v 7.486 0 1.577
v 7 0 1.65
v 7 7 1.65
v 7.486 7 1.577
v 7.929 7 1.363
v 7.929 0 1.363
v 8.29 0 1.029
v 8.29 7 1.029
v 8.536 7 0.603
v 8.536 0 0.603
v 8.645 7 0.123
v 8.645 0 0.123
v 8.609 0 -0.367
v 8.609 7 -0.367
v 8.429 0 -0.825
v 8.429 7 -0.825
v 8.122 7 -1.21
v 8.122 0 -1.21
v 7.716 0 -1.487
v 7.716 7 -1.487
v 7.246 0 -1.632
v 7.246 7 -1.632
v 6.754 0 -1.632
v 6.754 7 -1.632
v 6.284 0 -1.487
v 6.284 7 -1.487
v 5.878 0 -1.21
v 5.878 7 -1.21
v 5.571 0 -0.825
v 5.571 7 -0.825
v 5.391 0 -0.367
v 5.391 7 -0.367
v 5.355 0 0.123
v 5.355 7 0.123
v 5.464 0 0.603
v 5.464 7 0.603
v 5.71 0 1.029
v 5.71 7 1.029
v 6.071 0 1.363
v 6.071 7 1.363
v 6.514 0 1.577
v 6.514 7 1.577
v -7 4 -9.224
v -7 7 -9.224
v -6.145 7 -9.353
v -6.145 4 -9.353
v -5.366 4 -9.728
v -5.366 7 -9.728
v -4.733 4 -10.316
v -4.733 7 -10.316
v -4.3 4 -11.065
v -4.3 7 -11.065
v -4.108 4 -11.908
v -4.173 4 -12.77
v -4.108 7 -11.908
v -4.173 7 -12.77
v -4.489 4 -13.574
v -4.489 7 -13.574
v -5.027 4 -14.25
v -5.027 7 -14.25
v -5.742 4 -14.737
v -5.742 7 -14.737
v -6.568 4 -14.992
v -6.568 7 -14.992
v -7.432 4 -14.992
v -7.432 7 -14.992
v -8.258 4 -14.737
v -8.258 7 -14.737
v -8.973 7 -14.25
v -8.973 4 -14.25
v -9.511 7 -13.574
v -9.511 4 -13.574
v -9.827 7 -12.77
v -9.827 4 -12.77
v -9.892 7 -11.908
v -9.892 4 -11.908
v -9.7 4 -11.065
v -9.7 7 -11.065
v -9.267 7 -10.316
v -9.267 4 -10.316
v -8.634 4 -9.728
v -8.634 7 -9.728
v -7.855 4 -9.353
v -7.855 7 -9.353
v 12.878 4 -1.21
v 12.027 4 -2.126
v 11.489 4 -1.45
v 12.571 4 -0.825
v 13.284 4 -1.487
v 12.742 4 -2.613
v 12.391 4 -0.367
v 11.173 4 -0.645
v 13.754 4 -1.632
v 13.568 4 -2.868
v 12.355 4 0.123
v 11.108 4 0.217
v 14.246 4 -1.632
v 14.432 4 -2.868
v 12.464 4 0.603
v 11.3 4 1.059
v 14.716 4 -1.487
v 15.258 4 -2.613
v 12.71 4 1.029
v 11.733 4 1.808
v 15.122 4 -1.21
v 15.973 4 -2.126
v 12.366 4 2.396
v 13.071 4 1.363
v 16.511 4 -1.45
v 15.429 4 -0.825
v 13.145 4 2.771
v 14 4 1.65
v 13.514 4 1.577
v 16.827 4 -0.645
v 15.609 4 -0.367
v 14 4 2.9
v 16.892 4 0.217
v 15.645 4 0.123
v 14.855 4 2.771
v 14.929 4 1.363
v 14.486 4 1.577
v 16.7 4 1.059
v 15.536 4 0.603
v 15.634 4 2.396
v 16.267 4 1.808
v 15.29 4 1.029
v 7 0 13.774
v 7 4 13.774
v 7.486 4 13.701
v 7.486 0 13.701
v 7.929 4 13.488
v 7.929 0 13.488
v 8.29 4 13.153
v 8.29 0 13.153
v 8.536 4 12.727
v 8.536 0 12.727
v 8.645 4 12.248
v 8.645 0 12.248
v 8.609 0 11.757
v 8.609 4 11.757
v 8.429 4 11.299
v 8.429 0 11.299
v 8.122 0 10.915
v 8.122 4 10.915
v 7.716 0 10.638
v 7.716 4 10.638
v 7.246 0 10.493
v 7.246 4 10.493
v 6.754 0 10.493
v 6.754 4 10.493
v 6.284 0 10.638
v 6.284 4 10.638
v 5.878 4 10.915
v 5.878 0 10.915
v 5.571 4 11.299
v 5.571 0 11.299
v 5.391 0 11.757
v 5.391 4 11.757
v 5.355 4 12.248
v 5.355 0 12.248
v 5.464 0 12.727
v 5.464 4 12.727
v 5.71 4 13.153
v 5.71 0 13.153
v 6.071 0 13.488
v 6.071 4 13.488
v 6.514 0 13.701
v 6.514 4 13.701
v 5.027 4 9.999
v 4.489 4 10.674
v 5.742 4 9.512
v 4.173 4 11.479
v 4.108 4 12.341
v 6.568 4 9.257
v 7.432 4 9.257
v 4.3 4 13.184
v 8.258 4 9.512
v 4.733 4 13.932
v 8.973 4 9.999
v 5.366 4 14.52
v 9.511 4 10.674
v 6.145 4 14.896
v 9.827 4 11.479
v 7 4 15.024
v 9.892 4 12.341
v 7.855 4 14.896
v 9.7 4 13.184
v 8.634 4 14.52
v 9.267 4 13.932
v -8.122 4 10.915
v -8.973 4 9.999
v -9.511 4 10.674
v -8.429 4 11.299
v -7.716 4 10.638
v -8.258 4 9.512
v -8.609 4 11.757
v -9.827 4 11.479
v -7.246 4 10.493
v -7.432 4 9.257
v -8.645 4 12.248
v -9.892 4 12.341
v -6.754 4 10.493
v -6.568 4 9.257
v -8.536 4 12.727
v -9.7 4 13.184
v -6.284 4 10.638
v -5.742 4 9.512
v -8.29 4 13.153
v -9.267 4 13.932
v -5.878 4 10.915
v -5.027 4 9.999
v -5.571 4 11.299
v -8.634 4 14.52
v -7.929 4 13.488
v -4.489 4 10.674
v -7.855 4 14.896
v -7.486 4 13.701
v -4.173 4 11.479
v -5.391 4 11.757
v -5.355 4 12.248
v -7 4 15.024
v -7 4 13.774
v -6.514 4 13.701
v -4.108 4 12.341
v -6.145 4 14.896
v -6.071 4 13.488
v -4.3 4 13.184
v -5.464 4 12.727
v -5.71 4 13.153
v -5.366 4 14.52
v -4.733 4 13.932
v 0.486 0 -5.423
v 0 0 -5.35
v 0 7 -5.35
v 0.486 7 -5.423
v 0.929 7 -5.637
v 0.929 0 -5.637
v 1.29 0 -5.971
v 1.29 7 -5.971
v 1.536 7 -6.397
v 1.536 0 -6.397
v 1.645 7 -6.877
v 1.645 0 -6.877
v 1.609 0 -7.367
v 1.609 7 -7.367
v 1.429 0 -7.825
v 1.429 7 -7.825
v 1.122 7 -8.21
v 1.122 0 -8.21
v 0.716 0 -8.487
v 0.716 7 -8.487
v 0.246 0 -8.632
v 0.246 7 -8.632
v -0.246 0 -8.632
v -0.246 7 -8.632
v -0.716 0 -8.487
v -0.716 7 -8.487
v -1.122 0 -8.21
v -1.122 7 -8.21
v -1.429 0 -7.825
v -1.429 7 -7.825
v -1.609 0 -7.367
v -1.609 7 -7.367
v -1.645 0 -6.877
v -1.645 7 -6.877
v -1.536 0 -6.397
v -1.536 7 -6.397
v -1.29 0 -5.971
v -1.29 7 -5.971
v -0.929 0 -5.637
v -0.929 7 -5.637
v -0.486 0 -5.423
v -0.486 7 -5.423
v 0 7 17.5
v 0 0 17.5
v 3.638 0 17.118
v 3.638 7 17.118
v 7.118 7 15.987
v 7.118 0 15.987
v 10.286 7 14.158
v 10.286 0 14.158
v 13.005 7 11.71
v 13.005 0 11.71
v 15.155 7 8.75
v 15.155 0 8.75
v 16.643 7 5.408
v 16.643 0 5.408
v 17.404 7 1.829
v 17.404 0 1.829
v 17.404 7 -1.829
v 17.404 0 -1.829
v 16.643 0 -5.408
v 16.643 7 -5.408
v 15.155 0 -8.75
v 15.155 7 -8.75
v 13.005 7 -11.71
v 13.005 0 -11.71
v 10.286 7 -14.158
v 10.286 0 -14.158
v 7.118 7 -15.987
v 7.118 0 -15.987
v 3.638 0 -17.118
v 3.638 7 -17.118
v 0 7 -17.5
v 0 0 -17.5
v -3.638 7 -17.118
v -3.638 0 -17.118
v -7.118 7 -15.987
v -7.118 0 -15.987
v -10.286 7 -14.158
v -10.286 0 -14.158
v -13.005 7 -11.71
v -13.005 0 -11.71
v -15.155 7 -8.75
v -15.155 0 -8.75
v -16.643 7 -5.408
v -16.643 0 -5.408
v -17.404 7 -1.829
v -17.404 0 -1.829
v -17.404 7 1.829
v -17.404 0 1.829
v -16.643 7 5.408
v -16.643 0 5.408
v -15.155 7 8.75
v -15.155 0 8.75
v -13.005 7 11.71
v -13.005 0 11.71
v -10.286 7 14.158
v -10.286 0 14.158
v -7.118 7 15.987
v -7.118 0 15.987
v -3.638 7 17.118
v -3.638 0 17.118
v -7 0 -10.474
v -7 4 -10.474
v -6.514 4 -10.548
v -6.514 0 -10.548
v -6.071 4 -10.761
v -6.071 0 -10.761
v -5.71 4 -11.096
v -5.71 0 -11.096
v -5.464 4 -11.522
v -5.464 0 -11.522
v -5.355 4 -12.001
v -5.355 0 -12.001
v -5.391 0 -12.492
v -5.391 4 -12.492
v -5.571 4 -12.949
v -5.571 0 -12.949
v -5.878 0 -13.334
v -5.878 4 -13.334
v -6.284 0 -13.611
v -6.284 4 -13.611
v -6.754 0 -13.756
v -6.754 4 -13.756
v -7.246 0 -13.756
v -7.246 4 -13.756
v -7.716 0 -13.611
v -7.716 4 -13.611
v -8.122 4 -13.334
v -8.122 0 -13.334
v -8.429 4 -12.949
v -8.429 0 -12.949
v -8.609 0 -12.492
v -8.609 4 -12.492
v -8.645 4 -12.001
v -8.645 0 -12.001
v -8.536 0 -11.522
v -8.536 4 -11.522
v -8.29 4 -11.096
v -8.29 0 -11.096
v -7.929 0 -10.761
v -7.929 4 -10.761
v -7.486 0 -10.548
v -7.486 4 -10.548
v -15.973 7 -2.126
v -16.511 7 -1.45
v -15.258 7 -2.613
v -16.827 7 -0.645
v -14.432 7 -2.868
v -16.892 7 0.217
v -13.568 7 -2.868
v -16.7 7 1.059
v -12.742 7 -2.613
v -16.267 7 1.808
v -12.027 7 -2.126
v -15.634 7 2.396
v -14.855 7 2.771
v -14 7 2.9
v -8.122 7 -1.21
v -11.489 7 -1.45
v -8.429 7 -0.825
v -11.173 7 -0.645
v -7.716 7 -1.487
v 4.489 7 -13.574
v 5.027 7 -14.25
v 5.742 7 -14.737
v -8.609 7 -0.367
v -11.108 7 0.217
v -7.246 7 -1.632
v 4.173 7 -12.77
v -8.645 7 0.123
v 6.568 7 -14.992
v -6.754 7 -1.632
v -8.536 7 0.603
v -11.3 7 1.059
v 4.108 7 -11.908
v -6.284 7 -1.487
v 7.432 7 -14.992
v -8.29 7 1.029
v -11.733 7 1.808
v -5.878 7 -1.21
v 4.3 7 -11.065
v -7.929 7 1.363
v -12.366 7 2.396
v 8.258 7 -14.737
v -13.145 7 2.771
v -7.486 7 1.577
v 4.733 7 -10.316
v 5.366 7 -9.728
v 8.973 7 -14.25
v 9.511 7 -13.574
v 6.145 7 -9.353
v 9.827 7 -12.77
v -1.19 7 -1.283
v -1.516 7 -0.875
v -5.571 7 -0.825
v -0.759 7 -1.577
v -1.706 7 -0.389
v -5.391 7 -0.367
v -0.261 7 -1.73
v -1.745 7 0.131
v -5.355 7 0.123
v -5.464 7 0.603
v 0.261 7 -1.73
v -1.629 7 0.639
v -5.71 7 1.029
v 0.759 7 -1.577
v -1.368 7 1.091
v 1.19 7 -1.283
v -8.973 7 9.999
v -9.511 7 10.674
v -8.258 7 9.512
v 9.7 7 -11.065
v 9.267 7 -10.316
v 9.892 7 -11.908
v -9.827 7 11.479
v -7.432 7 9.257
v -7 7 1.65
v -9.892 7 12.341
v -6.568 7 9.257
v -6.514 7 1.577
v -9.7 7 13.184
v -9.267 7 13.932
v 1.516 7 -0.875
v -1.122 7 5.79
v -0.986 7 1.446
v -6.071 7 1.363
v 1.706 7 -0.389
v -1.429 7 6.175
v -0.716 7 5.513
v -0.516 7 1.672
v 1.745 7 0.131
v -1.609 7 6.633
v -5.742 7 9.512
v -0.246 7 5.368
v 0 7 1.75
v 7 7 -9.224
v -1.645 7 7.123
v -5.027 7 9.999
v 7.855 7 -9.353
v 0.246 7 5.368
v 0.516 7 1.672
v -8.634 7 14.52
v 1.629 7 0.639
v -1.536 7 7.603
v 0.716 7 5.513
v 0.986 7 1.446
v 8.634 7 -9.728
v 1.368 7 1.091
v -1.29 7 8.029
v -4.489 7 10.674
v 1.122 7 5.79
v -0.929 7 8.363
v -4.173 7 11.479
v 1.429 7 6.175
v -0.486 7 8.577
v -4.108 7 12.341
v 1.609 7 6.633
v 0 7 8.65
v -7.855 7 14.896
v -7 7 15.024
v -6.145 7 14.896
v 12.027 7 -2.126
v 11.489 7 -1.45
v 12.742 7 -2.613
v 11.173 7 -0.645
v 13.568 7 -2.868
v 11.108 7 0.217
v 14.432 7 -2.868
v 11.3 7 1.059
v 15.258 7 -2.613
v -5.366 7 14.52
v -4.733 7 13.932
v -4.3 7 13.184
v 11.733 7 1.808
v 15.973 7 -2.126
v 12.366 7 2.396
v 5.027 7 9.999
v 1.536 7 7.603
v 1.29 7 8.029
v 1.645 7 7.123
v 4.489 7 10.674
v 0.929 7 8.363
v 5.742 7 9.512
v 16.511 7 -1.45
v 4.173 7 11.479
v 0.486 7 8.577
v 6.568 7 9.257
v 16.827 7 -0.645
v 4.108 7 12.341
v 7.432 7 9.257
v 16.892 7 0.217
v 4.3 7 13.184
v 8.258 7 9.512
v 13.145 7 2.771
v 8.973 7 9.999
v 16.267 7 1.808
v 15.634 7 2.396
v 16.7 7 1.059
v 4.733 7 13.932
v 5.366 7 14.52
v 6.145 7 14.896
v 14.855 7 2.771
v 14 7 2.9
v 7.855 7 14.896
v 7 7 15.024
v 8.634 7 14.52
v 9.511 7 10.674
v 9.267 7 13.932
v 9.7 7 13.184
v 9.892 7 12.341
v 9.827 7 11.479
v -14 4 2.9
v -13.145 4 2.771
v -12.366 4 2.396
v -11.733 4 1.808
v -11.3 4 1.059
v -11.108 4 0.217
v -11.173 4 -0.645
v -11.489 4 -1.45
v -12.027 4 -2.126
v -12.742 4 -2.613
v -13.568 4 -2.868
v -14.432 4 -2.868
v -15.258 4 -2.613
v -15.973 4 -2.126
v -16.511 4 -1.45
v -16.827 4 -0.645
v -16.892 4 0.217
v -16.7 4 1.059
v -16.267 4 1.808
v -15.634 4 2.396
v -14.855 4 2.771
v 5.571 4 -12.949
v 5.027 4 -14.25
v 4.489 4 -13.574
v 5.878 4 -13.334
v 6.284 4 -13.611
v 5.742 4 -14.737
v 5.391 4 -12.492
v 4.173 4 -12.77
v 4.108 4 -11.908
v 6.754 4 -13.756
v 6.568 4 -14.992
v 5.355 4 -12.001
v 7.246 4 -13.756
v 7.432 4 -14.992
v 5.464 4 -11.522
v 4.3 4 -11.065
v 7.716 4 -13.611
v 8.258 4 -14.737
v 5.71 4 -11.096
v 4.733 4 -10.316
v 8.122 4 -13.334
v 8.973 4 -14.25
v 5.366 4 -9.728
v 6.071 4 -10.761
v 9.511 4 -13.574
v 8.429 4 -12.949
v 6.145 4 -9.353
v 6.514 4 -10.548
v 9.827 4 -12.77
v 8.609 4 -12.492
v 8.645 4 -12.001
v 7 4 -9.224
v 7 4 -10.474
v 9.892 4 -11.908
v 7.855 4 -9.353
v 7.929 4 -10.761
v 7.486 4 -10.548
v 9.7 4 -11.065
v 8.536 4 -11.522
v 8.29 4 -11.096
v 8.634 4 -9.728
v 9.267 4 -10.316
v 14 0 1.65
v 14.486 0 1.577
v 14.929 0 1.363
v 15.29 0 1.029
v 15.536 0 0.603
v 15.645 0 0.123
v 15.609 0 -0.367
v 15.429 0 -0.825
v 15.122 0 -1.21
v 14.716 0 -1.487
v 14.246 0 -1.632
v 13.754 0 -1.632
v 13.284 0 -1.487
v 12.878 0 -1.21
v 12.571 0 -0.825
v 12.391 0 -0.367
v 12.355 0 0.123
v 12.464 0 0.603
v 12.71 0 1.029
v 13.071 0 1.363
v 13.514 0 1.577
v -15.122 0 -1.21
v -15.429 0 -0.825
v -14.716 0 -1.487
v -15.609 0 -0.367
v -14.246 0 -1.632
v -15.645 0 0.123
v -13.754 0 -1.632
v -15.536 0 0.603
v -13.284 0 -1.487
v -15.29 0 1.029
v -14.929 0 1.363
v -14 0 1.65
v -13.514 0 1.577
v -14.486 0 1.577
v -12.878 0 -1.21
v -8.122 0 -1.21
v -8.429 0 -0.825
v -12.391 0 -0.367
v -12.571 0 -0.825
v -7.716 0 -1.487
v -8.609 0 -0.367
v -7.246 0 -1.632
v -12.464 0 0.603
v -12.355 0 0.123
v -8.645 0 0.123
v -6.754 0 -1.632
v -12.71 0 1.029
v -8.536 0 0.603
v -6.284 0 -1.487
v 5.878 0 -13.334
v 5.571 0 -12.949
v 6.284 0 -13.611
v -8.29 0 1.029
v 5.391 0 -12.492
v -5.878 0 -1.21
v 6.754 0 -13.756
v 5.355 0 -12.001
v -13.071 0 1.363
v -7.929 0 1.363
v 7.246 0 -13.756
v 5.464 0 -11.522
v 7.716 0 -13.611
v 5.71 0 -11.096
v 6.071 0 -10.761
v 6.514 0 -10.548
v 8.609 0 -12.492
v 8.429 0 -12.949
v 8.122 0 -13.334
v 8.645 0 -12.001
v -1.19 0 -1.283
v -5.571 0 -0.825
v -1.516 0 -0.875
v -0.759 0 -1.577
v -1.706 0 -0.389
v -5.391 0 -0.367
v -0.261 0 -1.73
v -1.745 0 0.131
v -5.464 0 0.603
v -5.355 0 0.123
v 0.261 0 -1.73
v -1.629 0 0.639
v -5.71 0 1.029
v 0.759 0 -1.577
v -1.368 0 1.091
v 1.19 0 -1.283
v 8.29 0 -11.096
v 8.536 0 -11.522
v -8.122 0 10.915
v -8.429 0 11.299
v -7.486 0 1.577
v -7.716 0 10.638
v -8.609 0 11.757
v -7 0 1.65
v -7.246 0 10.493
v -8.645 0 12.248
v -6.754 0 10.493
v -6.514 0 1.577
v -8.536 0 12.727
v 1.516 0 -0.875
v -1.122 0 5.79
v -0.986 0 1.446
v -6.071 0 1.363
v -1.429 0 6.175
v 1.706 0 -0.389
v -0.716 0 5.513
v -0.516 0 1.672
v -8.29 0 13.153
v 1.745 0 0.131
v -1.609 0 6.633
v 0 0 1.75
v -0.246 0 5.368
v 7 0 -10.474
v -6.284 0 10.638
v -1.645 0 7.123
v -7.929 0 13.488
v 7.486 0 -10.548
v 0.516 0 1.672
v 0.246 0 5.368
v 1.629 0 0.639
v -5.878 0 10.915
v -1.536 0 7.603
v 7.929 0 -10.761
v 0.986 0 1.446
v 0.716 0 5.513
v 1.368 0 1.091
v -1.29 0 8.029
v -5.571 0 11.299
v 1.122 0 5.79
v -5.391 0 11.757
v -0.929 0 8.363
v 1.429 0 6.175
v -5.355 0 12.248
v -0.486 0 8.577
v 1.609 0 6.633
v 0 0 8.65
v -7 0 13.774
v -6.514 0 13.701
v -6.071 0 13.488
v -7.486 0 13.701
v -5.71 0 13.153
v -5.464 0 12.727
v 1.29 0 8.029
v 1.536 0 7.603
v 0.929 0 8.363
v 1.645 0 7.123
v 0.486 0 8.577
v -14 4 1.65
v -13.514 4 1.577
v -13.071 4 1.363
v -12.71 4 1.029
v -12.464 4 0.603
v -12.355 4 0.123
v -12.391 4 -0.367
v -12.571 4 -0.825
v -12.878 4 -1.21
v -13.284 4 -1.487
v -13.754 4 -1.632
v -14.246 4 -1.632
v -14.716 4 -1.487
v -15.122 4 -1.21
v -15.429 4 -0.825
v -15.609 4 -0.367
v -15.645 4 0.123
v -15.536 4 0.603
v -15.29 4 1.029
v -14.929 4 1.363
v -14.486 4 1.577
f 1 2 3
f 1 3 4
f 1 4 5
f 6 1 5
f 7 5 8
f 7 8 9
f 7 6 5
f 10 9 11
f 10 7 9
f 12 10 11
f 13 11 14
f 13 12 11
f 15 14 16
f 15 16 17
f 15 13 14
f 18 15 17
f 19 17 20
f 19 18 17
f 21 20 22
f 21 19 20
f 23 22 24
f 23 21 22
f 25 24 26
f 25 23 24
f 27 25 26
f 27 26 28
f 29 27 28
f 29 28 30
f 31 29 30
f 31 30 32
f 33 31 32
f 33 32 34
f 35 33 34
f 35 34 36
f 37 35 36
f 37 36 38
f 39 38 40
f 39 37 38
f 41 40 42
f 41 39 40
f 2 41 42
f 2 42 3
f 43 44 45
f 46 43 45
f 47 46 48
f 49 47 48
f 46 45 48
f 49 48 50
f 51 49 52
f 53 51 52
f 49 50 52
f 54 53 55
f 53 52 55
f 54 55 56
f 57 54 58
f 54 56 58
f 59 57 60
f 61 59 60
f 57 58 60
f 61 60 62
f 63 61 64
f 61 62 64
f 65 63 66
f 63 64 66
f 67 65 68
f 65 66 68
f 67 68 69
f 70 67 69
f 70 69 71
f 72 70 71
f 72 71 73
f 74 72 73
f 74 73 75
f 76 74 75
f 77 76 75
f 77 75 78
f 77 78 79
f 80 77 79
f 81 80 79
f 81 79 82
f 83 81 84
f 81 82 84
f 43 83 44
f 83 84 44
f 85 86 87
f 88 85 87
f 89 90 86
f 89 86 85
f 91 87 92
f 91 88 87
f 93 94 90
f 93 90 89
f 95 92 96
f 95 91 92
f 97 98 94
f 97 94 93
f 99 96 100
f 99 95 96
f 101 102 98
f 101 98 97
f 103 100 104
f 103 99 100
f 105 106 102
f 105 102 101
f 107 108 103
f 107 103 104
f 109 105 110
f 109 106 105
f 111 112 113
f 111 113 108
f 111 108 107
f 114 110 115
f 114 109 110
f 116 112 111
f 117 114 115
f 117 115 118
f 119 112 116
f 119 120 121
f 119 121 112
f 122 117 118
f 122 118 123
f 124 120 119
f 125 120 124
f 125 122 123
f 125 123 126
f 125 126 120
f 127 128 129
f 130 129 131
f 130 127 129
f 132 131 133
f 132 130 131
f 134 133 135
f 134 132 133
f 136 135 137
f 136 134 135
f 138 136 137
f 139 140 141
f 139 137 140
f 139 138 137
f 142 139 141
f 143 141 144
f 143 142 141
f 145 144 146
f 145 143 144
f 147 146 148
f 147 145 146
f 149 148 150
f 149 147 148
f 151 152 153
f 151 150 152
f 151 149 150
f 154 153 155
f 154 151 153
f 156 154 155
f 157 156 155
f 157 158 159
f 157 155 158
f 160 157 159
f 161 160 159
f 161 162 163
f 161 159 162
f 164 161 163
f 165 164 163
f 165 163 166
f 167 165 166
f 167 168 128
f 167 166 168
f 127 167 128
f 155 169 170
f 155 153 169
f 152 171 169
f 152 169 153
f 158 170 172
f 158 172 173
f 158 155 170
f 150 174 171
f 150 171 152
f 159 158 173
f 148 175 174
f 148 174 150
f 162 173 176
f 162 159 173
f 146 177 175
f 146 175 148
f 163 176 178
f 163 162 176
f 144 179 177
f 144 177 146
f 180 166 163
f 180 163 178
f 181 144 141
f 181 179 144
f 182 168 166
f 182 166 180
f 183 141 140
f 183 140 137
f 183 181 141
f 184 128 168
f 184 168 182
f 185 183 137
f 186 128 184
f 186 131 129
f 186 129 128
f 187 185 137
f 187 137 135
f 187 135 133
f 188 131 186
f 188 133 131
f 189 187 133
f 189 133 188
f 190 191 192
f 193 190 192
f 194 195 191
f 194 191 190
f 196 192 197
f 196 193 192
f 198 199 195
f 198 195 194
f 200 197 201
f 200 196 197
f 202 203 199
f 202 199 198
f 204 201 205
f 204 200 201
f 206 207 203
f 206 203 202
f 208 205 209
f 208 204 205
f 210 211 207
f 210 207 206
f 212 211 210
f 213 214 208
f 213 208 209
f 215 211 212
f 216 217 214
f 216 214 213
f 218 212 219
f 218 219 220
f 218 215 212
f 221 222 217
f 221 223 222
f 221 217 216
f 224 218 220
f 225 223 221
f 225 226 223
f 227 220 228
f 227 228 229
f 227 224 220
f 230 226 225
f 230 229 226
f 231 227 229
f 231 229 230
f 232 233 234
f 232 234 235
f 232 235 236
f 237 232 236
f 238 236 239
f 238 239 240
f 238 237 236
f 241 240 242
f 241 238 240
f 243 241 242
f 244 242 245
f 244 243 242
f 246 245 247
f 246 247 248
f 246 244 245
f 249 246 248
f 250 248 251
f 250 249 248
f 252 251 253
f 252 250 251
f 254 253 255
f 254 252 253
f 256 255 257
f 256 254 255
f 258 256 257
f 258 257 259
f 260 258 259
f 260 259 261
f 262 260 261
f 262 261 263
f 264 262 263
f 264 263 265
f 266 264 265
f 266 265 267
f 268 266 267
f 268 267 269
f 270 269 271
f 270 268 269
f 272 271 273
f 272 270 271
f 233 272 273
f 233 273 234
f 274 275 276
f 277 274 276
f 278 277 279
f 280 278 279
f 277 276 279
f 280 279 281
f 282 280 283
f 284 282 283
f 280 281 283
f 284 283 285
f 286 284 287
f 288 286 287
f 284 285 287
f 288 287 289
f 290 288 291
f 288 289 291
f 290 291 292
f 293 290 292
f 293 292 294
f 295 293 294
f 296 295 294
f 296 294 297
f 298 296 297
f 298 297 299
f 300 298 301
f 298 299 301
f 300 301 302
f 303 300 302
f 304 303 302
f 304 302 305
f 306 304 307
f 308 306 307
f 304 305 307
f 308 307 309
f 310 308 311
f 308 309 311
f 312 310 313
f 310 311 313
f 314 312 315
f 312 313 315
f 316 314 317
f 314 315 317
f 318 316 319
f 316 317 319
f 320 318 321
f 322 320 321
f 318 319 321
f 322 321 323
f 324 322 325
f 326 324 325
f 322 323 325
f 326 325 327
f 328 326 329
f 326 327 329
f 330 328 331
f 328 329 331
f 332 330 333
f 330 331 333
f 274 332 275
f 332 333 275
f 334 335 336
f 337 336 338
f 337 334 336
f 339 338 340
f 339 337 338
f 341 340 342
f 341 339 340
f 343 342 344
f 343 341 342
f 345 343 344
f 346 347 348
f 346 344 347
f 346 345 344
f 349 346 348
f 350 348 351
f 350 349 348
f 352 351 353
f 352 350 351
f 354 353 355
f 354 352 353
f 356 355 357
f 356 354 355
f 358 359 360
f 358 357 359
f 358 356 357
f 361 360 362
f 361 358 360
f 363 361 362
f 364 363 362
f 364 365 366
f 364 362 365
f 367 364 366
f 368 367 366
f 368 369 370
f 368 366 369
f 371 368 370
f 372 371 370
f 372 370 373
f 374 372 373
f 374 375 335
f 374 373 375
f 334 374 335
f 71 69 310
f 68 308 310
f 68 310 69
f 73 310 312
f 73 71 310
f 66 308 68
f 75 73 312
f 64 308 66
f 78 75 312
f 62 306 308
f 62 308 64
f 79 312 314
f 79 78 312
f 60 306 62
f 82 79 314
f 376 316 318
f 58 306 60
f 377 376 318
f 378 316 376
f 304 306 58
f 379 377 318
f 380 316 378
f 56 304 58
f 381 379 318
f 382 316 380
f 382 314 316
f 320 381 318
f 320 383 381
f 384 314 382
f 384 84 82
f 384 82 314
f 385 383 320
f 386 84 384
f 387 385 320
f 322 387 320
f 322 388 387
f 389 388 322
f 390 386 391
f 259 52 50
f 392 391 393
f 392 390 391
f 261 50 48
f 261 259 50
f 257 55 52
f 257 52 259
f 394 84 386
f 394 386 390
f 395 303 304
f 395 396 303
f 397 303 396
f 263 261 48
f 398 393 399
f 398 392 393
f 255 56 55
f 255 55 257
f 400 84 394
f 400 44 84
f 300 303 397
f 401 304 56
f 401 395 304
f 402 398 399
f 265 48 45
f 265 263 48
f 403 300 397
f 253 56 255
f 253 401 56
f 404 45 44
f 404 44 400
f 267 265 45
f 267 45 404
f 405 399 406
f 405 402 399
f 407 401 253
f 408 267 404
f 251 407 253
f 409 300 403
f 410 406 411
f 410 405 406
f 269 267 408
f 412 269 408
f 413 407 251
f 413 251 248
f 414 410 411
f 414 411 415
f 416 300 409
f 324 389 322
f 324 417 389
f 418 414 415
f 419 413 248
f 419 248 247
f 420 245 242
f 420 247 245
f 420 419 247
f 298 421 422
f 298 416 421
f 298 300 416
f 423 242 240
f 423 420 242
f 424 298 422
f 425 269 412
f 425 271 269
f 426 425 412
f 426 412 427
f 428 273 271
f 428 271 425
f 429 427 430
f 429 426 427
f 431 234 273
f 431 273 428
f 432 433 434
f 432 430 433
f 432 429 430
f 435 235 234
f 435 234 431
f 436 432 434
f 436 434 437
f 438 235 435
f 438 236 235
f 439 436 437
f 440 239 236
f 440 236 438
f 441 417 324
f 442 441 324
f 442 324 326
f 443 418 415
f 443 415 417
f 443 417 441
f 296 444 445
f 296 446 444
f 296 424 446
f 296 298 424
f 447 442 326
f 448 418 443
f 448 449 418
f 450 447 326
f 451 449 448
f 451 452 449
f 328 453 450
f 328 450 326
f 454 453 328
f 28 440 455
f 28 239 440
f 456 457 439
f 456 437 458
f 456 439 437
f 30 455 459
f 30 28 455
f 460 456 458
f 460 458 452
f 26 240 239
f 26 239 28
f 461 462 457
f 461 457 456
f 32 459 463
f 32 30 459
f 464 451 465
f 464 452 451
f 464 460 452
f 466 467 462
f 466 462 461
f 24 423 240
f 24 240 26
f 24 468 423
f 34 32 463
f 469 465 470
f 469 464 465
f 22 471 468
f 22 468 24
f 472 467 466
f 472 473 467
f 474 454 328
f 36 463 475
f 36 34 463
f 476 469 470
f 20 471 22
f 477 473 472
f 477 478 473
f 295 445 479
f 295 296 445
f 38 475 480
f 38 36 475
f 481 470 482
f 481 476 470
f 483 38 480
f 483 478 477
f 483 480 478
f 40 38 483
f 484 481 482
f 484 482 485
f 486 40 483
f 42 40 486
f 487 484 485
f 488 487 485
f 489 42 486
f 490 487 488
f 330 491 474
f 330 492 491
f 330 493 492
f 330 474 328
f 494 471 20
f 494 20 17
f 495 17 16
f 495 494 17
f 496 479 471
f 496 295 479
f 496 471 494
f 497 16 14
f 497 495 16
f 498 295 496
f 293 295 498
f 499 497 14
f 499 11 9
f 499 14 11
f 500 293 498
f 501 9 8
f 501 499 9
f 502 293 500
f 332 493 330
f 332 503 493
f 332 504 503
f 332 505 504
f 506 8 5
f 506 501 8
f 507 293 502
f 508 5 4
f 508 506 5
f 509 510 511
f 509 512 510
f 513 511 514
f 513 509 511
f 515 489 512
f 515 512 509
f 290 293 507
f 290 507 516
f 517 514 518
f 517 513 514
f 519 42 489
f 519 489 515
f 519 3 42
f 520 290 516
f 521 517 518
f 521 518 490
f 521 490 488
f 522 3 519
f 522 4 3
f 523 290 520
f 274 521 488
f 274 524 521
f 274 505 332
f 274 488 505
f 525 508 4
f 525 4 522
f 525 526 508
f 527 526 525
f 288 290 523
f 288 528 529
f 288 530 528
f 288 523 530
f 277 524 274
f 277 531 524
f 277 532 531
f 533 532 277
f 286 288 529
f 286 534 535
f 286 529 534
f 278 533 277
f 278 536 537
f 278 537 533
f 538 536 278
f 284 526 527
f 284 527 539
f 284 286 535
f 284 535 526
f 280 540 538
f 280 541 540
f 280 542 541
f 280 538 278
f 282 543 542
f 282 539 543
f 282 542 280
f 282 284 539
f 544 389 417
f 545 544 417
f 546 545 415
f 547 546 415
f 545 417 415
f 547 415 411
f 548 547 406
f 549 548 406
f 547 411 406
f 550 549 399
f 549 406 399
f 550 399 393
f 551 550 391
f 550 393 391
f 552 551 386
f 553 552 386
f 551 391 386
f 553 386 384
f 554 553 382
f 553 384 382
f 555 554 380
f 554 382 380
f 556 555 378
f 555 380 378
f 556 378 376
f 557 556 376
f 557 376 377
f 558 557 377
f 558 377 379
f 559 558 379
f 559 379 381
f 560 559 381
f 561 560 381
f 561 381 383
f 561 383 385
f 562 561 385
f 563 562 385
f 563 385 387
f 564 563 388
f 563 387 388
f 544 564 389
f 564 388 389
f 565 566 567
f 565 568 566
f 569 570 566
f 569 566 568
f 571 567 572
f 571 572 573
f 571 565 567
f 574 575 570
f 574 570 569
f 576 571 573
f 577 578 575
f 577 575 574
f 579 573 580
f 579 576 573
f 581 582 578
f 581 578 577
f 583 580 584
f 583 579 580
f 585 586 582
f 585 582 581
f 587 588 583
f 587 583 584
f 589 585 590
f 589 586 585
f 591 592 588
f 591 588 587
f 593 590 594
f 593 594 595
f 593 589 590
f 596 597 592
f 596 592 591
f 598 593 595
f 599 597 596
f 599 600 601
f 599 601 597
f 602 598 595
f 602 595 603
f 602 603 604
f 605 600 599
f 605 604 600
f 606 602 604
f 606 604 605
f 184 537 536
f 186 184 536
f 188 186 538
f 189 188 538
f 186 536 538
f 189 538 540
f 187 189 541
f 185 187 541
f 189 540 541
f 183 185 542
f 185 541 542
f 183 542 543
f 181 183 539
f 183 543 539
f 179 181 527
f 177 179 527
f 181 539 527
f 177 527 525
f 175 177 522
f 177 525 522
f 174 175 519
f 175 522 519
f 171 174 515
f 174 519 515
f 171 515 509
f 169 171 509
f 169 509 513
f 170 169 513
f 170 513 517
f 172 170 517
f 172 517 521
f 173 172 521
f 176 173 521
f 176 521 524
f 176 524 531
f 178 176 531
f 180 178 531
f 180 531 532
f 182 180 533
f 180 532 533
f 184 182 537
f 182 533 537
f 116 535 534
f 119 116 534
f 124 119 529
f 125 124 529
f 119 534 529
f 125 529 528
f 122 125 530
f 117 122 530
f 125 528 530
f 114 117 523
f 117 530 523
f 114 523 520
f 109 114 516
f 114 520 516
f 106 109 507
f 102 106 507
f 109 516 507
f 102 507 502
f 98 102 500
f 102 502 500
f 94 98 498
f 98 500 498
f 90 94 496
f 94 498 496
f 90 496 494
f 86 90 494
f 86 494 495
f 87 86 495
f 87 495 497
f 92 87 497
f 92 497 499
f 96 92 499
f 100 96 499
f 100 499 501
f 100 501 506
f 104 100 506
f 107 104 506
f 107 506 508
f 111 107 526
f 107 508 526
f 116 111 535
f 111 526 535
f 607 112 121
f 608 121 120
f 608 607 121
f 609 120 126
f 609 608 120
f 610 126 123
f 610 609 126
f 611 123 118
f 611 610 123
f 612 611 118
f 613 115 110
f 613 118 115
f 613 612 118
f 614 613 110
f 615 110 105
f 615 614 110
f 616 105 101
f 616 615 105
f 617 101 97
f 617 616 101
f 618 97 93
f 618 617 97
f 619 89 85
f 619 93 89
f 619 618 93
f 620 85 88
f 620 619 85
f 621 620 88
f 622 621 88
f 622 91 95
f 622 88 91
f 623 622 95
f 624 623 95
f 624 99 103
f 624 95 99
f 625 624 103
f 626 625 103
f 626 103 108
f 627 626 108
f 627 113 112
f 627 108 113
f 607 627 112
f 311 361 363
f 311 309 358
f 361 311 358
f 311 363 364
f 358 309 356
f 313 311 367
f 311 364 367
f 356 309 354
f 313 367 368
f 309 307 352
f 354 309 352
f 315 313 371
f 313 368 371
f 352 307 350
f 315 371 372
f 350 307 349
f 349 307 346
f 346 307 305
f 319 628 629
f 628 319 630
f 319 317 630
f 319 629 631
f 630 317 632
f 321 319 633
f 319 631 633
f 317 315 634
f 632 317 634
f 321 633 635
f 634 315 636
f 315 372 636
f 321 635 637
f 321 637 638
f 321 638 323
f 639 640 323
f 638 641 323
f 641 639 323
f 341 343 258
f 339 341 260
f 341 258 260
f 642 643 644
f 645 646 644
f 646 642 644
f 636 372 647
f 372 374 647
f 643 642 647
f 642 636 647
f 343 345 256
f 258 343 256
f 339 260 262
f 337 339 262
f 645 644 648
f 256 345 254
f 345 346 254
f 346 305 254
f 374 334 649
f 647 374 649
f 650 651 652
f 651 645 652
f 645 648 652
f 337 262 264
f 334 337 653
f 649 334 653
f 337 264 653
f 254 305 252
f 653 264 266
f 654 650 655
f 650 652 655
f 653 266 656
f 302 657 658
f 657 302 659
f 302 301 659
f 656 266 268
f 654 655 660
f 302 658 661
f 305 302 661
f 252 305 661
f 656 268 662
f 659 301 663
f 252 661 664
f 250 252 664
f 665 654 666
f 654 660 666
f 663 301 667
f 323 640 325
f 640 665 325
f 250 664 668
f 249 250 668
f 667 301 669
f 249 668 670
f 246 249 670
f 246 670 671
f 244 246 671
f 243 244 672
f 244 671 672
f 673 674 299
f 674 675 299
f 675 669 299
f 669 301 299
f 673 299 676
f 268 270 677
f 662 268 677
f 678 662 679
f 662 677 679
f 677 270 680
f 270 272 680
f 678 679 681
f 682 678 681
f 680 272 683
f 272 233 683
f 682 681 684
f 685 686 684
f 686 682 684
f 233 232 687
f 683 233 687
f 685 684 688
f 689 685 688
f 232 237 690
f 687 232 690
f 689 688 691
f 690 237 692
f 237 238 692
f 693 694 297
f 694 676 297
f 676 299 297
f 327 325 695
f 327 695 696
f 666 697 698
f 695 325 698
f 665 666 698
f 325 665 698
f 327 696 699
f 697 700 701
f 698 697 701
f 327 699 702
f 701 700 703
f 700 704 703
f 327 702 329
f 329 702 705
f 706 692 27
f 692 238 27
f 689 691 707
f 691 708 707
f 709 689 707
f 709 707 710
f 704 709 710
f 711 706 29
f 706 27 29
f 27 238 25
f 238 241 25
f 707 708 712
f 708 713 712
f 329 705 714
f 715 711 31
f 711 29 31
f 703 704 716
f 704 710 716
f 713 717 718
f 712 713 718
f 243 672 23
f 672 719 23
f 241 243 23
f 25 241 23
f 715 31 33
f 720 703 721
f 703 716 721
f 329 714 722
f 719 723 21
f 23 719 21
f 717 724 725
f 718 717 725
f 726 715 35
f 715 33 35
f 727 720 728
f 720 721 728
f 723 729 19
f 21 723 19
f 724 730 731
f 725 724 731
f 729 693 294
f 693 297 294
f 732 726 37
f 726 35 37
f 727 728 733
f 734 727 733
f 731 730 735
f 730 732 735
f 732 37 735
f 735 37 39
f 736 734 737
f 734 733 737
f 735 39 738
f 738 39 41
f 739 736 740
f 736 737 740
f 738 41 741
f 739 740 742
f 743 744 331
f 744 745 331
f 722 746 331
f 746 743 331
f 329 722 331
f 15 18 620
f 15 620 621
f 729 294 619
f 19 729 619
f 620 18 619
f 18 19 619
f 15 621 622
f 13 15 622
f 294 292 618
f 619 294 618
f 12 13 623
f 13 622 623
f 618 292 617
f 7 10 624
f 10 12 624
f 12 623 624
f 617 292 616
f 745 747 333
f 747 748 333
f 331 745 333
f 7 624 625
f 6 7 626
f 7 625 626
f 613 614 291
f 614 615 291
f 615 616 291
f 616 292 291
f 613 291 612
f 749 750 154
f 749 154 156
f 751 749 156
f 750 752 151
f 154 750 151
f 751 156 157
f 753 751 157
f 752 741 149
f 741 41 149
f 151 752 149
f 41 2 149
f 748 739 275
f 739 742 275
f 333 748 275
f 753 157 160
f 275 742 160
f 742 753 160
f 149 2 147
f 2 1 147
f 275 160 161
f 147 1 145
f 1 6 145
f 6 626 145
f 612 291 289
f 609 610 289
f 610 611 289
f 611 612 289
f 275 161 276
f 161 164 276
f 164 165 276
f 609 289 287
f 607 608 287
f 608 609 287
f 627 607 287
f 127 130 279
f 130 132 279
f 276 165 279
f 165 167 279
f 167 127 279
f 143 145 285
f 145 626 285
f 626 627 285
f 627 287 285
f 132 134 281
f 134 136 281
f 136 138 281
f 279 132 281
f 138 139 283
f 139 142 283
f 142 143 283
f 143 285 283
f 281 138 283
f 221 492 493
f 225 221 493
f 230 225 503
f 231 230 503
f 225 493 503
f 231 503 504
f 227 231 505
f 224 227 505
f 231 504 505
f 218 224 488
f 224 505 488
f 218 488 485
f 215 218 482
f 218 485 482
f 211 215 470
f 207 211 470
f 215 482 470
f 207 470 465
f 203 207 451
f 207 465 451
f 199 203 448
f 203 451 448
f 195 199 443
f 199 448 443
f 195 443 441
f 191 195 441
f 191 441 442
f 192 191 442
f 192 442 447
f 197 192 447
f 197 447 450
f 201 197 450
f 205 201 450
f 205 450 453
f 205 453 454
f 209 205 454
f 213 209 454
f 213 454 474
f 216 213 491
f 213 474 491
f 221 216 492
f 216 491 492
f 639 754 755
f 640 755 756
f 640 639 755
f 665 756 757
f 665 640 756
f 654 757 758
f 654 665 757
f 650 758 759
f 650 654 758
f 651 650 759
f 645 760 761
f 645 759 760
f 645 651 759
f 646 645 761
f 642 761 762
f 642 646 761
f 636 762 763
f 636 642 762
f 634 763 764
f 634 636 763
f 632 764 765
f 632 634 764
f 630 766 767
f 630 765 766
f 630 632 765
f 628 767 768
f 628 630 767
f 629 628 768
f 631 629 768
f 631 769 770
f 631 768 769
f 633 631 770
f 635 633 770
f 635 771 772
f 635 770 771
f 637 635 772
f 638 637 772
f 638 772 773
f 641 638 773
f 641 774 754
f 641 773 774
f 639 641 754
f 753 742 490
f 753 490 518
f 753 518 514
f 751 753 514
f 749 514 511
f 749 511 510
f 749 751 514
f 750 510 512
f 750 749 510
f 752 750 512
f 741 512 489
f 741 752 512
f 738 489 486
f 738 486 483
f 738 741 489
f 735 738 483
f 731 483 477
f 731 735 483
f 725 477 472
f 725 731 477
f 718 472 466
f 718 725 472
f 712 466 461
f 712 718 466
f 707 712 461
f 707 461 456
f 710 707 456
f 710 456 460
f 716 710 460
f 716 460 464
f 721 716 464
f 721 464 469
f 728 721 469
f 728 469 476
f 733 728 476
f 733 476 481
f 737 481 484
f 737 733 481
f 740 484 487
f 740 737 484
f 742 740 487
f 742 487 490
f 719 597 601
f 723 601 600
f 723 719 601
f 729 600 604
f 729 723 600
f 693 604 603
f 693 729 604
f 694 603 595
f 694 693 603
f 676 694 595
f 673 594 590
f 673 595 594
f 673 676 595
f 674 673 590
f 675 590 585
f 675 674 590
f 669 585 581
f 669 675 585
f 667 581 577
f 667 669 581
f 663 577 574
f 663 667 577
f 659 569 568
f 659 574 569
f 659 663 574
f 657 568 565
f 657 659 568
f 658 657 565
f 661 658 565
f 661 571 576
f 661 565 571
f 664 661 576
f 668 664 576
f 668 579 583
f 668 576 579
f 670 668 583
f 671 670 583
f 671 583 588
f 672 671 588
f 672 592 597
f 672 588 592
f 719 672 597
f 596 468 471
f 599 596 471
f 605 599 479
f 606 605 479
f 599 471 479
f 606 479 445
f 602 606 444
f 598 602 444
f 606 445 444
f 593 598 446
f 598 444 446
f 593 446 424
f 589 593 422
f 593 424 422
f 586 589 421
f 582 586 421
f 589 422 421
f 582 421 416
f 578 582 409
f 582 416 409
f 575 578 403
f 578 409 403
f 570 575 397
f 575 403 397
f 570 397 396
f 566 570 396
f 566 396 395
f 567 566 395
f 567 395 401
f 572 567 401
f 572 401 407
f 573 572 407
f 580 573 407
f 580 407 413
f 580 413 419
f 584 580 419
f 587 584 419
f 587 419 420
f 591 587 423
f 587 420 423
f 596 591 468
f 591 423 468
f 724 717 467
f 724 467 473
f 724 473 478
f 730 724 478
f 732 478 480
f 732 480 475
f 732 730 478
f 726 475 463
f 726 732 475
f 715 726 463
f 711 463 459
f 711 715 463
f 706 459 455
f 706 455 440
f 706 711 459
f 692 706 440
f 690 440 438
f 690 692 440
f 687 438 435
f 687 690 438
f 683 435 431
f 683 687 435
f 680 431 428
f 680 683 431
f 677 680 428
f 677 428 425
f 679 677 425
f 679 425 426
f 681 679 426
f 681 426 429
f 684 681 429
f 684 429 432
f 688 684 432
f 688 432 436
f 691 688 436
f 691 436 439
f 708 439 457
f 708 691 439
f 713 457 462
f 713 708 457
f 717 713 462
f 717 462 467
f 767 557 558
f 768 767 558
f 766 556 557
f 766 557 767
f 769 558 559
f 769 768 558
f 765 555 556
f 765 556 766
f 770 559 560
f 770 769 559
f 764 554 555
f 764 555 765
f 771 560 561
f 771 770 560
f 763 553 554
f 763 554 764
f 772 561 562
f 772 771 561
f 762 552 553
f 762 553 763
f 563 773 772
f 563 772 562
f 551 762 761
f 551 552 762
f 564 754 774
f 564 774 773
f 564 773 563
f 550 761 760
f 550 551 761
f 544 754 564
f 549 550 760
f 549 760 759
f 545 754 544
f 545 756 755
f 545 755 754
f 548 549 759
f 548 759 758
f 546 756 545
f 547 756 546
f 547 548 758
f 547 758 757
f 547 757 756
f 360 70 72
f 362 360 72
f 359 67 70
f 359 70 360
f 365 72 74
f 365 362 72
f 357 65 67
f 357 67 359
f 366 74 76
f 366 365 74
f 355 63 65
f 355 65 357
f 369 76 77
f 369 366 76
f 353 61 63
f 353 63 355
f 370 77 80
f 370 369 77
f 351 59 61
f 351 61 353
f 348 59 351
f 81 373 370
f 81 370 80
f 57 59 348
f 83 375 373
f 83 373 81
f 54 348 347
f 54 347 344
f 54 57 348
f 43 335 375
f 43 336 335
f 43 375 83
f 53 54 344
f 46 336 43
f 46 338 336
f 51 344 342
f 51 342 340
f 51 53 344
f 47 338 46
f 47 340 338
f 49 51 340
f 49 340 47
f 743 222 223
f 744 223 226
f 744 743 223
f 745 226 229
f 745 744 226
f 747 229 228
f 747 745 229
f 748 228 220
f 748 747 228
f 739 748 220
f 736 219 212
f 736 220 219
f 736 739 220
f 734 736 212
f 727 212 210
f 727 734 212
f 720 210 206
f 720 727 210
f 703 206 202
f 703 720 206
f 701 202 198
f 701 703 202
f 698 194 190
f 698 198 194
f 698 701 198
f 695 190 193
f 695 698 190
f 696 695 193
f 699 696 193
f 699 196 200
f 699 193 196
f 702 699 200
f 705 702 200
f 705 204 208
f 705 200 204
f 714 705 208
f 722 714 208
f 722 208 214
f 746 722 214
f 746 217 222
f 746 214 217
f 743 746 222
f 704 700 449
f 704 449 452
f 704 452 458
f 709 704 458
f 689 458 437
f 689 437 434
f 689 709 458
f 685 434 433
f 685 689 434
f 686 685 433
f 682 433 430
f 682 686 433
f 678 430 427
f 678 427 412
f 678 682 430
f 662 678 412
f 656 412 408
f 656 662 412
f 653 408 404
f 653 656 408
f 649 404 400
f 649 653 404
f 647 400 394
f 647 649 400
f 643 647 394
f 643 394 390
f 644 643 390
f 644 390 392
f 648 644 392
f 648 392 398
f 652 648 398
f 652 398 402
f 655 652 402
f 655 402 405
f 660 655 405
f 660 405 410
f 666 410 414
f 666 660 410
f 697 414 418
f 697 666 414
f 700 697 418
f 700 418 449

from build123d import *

# Parameters (mm, degrees)
SKETCH_1_R          = 17.5
SKETCH_1_R_2        = 1.65
SKETCH_1_R_3        = 1.75
EXTRUDE_1_DEPTH     = 7
SKETCH_2_R          = 2.9
CUT_EXTRUDE_1_DEPTH = 3


with BuildPart() as part:
    # 草图1 → 凸台-拉伸1 (new body)
    with BuildSketch(Plane(origin=(0, 0, 0), x_dir=(1, 0, 0), z_dir=(0, 1, 0))):
        with Locations(Location((0, 0, 0), (0, 0, 270))):
            Circle(SKETCH_1_R)
        with Locations(Location((-14, 0, 0), (0, 0, 270))):
            Circle(SKETCH_1_R_2, mode=Mode.SUBTRACT)
        with Locations(Location((-7, 12.124355653, 0), (0, 0, 270))):
            Circle(SKETCH_1_R_2, mode=Mode.SUBTRACT)
        with Locations(Location((7, 12.124355653, 0), (0, 0, 270))):
            Circle(SKETCH_1_R_2, mode=Mode.SUBTRACT)
        with Locations(Location((14, 0, 0), (0, 0, 270))):
            Circle(SKETCH_1_R_2, mode=Mode.SUBTRACT)
        with Locations(Location((7, -12.124355653, 0), (0, 0, 270))):
            Circle(SKETCH_1_R_2, mode=Mode.SUBTRACT)
        with Locations(Location((-7, -12.124355653, 0), (0, 0, 270))):
            Circle(SKETCH_1_R_2, mode=Mode.SUBTRACT)
        with Locations(Location((0, 0, 0), (0, 0, 270))):
            Circle(SKETCH_1_R_3, mode=Mode.SUBTRACT)
        with Locations(Location((7, 0, 0), (0, 0, 270))):
            Circle(SKETCH_1_R_2, mode=Mode.SUBTRACT)
        with Locations(Location((0, -7, 0), (0, 0, 270))):
            Circle(SKETCH_1_R_2, mode=Mode.SUBTRACT)
        with Locations(Location((-7, 0, 0), (0, 0, 270))):
            Circle(SKETCH_1_R_2, mode=Mode.SUBTRACT)
        with Locations(Location((0, 7, 0), (0, 0, 270))):
            Circle(SKETCH_1_R_2, mode=Mode.SUBTRACT)
    extrude(amount=EXTRUDE_1_DEPTH)

    # 草图2 → 切除-拉伸1 (cut)
    with BuildSketch(Plane(origin=(0, 7, 0), x_dir=(1, 0, 0), z_dir=(0, 1, 0))):
        with Locations(Location((-14, 0, 0), (0, 0, 270))):
            Circle(SKETCH_2_R)
        with Locations(Location((-7, 12.124355653, 0), (0, 0, 270))):
            Circle(SKETCH_2_R)
        with Locations(Location((7, 12.124355653, 0), (0, 0, 270))):
            Circle(SKETCH_2_R)
        with Locations(Location((14, 0, 0), (0, 0, 270))):
            Circle(SKETCH_2_R)
        with Locations(Location((7, -12.124355653, 0), (0, 0, 270))):
            Circle(SKETCH_2_R)
        with Locations(Location((-7, -12.124355653, 0), (0, 0, 270))):
            Circle(SKETCH_2_R)
    extrude(amount=-CUT_EXTRUDE_1_DEPTH, mode=Mode.SUBTRACT)


solid = part.part
